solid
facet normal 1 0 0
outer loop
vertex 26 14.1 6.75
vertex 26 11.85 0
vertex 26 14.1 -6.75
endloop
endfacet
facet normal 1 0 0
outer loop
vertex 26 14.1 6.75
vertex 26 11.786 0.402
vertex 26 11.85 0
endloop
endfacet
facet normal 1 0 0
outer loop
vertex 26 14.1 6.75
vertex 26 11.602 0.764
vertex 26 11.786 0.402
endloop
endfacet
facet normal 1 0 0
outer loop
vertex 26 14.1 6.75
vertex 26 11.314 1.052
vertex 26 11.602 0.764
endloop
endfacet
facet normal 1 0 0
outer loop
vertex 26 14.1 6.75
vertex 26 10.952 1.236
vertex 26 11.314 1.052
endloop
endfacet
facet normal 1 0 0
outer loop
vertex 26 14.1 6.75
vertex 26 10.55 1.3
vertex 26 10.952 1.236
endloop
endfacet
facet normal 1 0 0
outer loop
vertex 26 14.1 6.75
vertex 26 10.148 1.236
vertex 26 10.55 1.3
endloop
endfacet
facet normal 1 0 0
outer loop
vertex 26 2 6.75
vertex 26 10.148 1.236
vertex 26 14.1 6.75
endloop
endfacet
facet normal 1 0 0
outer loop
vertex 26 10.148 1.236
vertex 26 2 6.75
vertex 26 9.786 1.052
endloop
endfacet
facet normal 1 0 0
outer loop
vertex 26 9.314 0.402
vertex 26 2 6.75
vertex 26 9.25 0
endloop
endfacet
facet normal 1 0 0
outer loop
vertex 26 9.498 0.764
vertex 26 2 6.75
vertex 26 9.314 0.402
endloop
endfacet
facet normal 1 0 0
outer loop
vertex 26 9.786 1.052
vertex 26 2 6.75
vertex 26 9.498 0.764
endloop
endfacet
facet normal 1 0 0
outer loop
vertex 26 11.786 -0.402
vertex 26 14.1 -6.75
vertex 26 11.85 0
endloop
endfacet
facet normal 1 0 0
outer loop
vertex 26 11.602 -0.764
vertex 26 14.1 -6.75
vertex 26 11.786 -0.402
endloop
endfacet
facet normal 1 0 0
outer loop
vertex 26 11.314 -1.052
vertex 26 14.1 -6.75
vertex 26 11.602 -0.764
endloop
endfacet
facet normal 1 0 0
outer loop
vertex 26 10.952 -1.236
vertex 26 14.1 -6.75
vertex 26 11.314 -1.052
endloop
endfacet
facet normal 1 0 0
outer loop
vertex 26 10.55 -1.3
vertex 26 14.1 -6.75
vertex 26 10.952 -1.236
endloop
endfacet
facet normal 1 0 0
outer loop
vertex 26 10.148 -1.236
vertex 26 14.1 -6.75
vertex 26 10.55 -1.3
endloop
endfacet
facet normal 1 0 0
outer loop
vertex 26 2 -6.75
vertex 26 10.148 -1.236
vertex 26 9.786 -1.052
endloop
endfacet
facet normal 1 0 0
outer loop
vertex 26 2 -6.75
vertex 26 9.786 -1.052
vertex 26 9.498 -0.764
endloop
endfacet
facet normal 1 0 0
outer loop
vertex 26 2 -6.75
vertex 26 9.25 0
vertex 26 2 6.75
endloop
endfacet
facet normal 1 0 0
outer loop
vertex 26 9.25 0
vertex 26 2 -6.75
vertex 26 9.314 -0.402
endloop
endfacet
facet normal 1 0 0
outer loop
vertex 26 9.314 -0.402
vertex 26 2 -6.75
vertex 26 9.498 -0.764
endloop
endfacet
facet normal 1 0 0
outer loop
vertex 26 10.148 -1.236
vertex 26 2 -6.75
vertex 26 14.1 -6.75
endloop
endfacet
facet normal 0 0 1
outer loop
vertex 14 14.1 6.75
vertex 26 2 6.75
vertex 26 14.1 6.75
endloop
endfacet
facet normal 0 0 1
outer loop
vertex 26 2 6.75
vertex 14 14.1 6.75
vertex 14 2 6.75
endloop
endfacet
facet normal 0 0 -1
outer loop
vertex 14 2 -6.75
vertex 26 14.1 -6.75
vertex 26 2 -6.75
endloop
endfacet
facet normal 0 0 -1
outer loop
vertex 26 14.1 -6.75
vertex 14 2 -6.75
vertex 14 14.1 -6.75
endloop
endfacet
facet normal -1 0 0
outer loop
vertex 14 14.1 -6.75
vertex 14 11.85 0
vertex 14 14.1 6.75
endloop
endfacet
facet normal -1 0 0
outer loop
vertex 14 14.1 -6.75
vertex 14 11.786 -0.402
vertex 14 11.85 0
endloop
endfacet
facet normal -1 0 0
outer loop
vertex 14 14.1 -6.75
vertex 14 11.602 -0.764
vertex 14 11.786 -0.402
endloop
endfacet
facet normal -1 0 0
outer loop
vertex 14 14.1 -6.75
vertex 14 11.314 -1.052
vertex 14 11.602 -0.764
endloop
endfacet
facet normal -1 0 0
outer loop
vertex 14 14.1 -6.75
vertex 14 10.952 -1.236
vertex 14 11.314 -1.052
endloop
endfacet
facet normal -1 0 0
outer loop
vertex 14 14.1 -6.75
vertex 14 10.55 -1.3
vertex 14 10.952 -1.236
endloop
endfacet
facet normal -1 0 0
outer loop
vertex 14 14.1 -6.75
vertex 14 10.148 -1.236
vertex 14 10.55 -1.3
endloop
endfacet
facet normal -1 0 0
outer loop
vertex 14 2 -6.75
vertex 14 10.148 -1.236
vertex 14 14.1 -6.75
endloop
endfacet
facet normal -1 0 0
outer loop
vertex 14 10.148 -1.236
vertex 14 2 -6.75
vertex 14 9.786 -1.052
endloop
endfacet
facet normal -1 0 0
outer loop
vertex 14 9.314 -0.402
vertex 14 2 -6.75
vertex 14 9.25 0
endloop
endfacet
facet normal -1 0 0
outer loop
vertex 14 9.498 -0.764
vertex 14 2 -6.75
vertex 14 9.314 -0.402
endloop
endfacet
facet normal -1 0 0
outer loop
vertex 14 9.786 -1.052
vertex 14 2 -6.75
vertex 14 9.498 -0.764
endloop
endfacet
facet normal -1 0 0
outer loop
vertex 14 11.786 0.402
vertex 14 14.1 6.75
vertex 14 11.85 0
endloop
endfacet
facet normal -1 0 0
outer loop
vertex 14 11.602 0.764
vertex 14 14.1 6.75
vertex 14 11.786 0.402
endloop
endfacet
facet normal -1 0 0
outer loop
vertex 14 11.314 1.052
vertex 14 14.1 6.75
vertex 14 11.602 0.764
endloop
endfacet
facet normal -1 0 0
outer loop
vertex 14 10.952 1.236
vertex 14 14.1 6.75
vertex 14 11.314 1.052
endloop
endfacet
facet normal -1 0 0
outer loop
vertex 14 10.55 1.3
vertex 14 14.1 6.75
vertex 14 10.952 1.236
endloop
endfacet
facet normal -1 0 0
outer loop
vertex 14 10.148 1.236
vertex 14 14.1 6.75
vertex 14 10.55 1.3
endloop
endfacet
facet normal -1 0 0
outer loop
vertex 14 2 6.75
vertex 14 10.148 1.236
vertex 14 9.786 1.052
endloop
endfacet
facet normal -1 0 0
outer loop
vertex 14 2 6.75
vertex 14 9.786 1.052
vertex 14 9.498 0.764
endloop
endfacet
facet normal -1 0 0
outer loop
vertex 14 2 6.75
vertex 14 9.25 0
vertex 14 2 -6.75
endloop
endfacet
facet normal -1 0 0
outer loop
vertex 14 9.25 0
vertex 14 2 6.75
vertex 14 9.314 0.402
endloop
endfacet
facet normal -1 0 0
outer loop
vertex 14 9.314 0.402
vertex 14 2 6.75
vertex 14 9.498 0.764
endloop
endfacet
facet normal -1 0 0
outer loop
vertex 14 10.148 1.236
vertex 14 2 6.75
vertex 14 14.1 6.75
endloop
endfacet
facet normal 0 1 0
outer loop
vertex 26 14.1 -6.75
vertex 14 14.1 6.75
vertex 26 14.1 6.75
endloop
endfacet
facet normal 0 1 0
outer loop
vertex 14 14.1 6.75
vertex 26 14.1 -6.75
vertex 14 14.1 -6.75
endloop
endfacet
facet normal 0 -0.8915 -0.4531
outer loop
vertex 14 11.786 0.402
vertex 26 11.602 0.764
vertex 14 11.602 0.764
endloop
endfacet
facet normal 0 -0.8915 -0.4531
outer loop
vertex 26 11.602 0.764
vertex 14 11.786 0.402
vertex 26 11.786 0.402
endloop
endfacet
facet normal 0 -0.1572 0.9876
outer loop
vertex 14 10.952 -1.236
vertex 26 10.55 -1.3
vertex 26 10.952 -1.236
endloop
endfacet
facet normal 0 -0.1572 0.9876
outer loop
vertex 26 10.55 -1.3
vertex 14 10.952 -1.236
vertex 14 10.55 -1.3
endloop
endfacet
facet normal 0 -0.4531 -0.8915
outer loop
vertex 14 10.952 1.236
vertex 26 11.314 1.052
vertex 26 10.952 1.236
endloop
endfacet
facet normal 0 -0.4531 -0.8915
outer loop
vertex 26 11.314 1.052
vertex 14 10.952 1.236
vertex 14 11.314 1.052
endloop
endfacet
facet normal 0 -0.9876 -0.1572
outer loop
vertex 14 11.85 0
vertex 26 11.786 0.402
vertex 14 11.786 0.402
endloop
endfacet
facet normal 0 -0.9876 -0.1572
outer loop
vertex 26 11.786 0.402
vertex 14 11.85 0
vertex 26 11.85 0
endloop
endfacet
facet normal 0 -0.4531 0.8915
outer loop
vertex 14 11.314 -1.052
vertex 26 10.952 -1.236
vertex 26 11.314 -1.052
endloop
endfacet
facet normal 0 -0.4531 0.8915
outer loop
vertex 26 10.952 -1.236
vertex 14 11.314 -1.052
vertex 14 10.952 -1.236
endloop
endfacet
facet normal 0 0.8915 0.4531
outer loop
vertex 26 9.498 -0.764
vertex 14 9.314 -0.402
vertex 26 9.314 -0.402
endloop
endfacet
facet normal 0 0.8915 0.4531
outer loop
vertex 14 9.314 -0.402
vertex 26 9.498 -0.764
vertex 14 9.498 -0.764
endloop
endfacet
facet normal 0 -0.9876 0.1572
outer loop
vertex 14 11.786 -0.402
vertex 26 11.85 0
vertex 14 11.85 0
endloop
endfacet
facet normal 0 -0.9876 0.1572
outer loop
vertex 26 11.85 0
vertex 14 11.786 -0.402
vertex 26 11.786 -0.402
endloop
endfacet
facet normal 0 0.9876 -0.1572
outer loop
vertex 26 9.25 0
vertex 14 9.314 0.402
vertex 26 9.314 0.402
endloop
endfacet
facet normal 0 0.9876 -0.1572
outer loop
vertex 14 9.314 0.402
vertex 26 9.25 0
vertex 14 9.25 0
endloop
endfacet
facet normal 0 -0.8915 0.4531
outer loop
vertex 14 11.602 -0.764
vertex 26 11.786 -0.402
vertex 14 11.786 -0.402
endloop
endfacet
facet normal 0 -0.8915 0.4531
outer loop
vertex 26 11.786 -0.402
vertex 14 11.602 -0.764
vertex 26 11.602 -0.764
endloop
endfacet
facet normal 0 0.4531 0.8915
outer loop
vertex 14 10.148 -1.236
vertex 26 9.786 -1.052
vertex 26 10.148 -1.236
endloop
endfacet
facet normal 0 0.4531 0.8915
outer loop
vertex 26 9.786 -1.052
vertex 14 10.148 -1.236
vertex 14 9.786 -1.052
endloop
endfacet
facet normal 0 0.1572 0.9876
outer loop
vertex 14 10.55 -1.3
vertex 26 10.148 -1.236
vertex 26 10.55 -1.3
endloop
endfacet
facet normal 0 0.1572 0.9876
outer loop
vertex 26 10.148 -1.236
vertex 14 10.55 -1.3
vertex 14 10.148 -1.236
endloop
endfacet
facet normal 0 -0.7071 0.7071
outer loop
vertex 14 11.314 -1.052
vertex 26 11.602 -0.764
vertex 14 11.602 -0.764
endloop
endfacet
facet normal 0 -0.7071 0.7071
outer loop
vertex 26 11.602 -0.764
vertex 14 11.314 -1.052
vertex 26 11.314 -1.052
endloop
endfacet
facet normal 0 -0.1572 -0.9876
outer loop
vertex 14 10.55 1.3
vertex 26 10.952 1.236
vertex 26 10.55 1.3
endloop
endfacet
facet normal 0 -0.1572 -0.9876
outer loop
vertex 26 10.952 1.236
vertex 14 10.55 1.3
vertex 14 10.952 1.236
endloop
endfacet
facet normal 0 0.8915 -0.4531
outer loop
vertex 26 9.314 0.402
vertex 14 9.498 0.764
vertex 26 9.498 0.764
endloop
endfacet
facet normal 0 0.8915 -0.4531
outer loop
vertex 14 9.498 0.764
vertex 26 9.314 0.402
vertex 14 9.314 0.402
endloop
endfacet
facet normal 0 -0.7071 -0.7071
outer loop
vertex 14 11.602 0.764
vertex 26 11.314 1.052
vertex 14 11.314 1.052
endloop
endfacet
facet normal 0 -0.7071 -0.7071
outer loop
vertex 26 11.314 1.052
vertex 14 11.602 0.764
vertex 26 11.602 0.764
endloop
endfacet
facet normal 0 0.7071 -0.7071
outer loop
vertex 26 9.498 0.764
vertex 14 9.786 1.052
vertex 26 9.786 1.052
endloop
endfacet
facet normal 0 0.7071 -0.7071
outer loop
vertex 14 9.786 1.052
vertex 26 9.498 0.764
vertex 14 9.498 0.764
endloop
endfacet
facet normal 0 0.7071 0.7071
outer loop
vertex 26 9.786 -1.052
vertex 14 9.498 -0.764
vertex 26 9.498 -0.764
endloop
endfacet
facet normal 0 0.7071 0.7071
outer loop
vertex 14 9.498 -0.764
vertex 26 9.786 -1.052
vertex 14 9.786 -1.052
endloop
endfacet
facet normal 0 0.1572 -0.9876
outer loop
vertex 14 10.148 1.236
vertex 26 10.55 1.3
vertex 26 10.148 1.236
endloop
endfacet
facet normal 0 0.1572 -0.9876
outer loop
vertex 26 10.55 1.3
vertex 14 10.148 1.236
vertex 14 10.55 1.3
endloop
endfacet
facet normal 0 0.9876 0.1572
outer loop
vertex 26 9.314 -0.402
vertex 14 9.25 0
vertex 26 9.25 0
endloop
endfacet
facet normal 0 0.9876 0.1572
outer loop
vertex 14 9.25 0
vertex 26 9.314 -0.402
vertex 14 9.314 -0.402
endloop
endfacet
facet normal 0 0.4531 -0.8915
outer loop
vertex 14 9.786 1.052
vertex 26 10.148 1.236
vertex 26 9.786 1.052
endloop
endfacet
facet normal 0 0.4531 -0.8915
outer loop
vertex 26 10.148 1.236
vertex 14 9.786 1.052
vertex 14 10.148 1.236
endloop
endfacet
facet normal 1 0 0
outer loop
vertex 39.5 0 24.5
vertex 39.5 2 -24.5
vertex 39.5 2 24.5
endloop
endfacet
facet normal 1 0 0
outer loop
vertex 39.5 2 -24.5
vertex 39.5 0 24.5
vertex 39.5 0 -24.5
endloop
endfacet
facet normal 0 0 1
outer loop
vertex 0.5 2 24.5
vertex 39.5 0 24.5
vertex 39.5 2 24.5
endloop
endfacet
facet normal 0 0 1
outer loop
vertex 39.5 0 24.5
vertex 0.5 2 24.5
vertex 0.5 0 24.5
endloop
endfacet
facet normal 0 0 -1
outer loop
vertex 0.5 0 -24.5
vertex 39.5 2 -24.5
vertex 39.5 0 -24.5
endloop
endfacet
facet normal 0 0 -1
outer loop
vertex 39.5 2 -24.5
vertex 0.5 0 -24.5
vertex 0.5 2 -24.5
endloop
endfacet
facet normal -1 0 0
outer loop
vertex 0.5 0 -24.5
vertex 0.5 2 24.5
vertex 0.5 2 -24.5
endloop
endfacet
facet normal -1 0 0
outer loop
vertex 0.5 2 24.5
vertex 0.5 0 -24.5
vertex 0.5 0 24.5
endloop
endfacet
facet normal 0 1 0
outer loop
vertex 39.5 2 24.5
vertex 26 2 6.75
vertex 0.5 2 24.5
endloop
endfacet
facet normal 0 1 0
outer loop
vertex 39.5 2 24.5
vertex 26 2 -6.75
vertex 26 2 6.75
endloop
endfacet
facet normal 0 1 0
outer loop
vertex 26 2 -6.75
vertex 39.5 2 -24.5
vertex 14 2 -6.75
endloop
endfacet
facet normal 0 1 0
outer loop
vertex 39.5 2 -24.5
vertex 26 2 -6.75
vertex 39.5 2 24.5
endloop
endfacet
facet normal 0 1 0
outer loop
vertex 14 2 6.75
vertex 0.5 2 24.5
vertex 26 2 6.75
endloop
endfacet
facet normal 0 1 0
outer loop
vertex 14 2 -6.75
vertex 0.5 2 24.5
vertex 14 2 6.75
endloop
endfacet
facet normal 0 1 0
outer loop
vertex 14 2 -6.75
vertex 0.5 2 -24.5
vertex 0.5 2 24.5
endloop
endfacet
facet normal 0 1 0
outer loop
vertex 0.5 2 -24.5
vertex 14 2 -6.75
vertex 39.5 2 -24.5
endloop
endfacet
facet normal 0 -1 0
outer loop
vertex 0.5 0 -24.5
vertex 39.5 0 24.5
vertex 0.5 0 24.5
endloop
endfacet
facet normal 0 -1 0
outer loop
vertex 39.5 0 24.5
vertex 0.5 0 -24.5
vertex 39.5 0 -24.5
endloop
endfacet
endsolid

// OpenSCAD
diameter = 9.5;
wall_size = 2;
screw_size = 3.1;
srew_tap_size = 2.6;
mount_width = diameter + (2 * wall_size);
mount_height = mount_width + screw_size + wall_size;
cut_width = diameter - 2;
width = 40;
depth = 75;
center_width = 12;
center_offset = 5;
top_width = 39;
top_height = 49;

$fn = 20;

module single_mount() {
    translate([mount_width, mount_height, 0])
    rotate([0, -90, 90])
    difference() {
        cube([mount_width, mount_width, mount_height]);
        
        translate([mount_width / 2, mount_width + 1, mount_height - (diameter / 2) - wall_size])
            rotate([90, 0, 0])
            cylinder(d = diameter, h = mount_width + 2);
        
        translate([(mount_width - cut_width) / 2, -1, -1])
            cube([cut_width, mount_width + 2, diameter + wall_size + 1]);
        
        translate([-1, mount_width / 2, wall_size + (screw_size / 2)])
            rotate([0, 90, 0])
            cylinder(d = screw_size, h = mount_width + 2);
    }
}

module single_holder() {
    single_mount();
    
    difference() {
        translate([0, -(depth - mount_height), 0])
            cube([mount_width, depth - mount_height, mount_width]);
        
        translate([-1, wall_size + (screw_size / 2) - (depth - mount_height), mount_width / 2])
            rotate([0, 90, 0])
            cylinder(d = screw_size, h = mount_width + 2);
    }
}

module holders() {
    single_holder();
    
    translate([width - mount_width, 0, 0])
        single_holder();
}

module center() {
    translate([(width - center_width) / 2, -center_offset - (depth - mount_height), 0])
    difference() {
        cube([center_width, screw_size + (2 * wall_size) + center_offset, mount_width]);
        
        translate([-1, center_offset + wall_size + (screw_size / 2), mount_width / 2])
            rotate([0, 90, 0])
            cylinder(d = srew_tap_size, h = center_width + 2);
    }
    
    translate([(width - top_width) / 2, -wall_size - center_offset - (depth - mount_height), -(top_height - mount_width) / 2])
        cube([top_width, wall_size, top_height]);
}

translate([0, depth - mount_height + wall_size + center_offset, -mount_width / 2])
union() {
    //single_holder();
    
    //holders();
    center();
}
